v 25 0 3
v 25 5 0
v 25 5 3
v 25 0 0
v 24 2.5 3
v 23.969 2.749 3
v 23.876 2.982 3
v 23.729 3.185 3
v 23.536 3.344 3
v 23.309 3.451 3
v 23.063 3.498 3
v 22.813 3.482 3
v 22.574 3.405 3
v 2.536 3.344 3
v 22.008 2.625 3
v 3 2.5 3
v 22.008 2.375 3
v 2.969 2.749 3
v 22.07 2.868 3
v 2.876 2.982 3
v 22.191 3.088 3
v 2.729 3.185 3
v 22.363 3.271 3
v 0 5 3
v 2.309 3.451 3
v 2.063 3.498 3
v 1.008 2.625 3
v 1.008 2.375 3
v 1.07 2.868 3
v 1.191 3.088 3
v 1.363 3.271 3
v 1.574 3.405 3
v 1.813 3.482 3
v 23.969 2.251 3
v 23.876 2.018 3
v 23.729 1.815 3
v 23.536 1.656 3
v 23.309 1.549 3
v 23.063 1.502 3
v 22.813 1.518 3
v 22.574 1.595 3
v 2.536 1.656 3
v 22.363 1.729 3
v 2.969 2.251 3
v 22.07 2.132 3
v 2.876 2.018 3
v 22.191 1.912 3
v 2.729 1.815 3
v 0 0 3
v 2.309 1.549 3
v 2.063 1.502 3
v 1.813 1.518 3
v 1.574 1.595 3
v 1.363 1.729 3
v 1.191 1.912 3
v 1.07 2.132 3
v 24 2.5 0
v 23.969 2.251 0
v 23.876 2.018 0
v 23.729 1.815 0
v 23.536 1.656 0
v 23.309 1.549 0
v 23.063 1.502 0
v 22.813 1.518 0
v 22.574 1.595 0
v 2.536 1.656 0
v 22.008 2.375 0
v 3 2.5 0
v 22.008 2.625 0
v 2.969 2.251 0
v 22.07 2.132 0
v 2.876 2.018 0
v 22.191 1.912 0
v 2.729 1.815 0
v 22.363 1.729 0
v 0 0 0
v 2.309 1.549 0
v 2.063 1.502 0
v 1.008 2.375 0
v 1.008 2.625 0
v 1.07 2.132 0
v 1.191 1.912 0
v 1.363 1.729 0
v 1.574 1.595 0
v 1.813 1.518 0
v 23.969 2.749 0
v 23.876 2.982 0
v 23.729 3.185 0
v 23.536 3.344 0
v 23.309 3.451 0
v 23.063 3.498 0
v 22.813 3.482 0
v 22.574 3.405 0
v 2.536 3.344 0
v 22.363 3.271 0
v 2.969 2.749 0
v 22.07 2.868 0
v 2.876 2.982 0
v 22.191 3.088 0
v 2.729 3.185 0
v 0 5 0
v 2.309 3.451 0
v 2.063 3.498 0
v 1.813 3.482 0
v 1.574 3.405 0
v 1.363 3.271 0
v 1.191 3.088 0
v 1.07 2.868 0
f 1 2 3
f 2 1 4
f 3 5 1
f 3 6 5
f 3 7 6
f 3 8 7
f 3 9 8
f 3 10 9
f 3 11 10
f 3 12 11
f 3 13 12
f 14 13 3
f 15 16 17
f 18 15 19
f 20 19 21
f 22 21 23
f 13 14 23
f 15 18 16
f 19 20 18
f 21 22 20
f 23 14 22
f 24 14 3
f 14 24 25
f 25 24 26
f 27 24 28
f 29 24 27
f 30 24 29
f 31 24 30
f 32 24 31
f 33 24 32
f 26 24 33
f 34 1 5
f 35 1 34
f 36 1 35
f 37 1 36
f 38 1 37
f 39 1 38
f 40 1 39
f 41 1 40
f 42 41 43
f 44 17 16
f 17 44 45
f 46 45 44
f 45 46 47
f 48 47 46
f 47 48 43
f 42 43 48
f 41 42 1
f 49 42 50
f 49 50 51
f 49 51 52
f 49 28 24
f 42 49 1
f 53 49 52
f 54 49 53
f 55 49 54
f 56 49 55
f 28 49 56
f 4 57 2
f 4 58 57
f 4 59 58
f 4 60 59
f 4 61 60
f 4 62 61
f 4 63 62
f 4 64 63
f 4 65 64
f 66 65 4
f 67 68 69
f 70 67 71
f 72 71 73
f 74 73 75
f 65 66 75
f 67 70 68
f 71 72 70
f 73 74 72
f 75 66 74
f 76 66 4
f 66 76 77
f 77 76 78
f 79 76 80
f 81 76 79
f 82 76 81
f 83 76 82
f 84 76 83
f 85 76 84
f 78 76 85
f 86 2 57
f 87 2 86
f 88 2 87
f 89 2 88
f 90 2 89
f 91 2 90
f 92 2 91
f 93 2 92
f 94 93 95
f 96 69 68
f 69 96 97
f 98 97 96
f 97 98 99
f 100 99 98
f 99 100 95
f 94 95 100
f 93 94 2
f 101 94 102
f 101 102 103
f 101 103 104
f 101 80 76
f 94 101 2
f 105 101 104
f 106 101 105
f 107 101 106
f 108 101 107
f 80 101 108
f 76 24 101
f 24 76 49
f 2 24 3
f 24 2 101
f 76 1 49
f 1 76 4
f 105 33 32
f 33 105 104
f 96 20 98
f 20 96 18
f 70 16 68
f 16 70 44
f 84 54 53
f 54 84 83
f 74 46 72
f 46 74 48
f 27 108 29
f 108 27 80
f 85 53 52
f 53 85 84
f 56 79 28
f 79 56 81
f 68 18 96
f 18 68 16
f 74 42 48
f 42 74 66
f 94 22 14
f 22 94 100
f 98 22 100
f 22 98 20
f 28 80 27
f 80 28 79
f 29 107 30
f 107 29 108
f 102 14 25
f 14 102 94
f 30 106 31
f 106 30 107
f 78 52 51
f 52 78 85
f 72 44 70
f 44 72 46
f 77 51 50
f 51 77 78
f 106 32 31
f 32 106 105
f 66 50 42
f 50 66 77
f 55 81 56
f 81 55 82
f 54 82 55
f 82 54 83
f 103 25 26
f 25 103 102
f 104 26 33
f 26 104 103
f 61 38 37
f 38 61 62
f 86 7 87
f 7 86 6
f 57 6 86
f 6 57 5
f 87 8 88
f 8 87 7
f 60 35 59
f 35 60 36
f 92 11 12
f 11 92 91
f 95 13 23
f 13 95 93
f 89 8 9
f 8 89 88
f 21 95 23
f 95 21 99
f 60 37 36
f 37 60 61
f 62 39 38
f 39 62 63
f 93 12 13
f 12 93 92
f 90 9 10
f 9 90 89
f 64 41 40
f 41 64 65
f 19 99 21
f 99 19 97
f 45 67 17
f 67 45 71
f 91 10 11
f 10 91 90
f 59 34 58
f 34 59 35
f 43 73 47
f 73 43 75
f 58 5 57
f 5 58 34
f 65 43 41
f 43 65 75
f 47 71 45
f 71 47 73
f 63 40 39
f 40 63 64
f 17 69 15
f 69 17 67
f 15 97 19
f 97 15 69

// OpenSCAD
//scale of the full design
SCALE = 1;

//resolution of the hole cutouts
RESOLUTION = 25;

//connector length
LENGTH = 25 * SCALE;

//connector width
WIDTH = 5 * SCALE;

//connector thickness
THICK = 3 * SCALE;

//hole radius
RADIUS = 1 * SCALE;

//hole offset from edge
OFFSET = 1 * SCALE;

difference(){
  //CONNECTOR SHAPE
  cube([
    //LENGTH (x-axis)
    LENGTH, 
    
    //WIDTH (y-axis)
    WIDTH,
  
    //HEIGHT (z-axis)
    THICK]);
  
  //HOLE 1
  translate([
    //X TRANSLATION
    RADIUS + OFFSET, //offset from edge
  
    //Y TRANSLATION
    WIDTH / 2, //middle of connector width
  
    //Z TRANSLATION
    -THICK / 2]) //move down so hole is cut from top to bottom
  
  #cylinder(
    //RESOLUTION
    $fn = RESOLUTION,
    
    //HEIGHT
    THICK * 2, //double the connector thickness
    
    //BOTTOM RADIUS
    RADIUS,
    
    //TOP RADIUS
    RADIUS);
  
  //HOLE 2
  translate([
    //X TRANSLATION
    LENGTH - RADIUS - OFFSET, //offset from edge
  
    //Y TRANSLATION
    WIDTH / 2, //middle of connector width
  
    //Z TRANSLATION
    -THICK / 2]) //move down so hole is cut from top to bottom
  
  #cylinder(
    //RESOLUTION
    $fn = RESOLUTION,
    
    //HEIGHT
    THICK * 2, //double the connector thickness
    
    //BOTTOM RADIUS
    RADIUS,
    
    //TOP RADIUS
    RADIUS);
}
